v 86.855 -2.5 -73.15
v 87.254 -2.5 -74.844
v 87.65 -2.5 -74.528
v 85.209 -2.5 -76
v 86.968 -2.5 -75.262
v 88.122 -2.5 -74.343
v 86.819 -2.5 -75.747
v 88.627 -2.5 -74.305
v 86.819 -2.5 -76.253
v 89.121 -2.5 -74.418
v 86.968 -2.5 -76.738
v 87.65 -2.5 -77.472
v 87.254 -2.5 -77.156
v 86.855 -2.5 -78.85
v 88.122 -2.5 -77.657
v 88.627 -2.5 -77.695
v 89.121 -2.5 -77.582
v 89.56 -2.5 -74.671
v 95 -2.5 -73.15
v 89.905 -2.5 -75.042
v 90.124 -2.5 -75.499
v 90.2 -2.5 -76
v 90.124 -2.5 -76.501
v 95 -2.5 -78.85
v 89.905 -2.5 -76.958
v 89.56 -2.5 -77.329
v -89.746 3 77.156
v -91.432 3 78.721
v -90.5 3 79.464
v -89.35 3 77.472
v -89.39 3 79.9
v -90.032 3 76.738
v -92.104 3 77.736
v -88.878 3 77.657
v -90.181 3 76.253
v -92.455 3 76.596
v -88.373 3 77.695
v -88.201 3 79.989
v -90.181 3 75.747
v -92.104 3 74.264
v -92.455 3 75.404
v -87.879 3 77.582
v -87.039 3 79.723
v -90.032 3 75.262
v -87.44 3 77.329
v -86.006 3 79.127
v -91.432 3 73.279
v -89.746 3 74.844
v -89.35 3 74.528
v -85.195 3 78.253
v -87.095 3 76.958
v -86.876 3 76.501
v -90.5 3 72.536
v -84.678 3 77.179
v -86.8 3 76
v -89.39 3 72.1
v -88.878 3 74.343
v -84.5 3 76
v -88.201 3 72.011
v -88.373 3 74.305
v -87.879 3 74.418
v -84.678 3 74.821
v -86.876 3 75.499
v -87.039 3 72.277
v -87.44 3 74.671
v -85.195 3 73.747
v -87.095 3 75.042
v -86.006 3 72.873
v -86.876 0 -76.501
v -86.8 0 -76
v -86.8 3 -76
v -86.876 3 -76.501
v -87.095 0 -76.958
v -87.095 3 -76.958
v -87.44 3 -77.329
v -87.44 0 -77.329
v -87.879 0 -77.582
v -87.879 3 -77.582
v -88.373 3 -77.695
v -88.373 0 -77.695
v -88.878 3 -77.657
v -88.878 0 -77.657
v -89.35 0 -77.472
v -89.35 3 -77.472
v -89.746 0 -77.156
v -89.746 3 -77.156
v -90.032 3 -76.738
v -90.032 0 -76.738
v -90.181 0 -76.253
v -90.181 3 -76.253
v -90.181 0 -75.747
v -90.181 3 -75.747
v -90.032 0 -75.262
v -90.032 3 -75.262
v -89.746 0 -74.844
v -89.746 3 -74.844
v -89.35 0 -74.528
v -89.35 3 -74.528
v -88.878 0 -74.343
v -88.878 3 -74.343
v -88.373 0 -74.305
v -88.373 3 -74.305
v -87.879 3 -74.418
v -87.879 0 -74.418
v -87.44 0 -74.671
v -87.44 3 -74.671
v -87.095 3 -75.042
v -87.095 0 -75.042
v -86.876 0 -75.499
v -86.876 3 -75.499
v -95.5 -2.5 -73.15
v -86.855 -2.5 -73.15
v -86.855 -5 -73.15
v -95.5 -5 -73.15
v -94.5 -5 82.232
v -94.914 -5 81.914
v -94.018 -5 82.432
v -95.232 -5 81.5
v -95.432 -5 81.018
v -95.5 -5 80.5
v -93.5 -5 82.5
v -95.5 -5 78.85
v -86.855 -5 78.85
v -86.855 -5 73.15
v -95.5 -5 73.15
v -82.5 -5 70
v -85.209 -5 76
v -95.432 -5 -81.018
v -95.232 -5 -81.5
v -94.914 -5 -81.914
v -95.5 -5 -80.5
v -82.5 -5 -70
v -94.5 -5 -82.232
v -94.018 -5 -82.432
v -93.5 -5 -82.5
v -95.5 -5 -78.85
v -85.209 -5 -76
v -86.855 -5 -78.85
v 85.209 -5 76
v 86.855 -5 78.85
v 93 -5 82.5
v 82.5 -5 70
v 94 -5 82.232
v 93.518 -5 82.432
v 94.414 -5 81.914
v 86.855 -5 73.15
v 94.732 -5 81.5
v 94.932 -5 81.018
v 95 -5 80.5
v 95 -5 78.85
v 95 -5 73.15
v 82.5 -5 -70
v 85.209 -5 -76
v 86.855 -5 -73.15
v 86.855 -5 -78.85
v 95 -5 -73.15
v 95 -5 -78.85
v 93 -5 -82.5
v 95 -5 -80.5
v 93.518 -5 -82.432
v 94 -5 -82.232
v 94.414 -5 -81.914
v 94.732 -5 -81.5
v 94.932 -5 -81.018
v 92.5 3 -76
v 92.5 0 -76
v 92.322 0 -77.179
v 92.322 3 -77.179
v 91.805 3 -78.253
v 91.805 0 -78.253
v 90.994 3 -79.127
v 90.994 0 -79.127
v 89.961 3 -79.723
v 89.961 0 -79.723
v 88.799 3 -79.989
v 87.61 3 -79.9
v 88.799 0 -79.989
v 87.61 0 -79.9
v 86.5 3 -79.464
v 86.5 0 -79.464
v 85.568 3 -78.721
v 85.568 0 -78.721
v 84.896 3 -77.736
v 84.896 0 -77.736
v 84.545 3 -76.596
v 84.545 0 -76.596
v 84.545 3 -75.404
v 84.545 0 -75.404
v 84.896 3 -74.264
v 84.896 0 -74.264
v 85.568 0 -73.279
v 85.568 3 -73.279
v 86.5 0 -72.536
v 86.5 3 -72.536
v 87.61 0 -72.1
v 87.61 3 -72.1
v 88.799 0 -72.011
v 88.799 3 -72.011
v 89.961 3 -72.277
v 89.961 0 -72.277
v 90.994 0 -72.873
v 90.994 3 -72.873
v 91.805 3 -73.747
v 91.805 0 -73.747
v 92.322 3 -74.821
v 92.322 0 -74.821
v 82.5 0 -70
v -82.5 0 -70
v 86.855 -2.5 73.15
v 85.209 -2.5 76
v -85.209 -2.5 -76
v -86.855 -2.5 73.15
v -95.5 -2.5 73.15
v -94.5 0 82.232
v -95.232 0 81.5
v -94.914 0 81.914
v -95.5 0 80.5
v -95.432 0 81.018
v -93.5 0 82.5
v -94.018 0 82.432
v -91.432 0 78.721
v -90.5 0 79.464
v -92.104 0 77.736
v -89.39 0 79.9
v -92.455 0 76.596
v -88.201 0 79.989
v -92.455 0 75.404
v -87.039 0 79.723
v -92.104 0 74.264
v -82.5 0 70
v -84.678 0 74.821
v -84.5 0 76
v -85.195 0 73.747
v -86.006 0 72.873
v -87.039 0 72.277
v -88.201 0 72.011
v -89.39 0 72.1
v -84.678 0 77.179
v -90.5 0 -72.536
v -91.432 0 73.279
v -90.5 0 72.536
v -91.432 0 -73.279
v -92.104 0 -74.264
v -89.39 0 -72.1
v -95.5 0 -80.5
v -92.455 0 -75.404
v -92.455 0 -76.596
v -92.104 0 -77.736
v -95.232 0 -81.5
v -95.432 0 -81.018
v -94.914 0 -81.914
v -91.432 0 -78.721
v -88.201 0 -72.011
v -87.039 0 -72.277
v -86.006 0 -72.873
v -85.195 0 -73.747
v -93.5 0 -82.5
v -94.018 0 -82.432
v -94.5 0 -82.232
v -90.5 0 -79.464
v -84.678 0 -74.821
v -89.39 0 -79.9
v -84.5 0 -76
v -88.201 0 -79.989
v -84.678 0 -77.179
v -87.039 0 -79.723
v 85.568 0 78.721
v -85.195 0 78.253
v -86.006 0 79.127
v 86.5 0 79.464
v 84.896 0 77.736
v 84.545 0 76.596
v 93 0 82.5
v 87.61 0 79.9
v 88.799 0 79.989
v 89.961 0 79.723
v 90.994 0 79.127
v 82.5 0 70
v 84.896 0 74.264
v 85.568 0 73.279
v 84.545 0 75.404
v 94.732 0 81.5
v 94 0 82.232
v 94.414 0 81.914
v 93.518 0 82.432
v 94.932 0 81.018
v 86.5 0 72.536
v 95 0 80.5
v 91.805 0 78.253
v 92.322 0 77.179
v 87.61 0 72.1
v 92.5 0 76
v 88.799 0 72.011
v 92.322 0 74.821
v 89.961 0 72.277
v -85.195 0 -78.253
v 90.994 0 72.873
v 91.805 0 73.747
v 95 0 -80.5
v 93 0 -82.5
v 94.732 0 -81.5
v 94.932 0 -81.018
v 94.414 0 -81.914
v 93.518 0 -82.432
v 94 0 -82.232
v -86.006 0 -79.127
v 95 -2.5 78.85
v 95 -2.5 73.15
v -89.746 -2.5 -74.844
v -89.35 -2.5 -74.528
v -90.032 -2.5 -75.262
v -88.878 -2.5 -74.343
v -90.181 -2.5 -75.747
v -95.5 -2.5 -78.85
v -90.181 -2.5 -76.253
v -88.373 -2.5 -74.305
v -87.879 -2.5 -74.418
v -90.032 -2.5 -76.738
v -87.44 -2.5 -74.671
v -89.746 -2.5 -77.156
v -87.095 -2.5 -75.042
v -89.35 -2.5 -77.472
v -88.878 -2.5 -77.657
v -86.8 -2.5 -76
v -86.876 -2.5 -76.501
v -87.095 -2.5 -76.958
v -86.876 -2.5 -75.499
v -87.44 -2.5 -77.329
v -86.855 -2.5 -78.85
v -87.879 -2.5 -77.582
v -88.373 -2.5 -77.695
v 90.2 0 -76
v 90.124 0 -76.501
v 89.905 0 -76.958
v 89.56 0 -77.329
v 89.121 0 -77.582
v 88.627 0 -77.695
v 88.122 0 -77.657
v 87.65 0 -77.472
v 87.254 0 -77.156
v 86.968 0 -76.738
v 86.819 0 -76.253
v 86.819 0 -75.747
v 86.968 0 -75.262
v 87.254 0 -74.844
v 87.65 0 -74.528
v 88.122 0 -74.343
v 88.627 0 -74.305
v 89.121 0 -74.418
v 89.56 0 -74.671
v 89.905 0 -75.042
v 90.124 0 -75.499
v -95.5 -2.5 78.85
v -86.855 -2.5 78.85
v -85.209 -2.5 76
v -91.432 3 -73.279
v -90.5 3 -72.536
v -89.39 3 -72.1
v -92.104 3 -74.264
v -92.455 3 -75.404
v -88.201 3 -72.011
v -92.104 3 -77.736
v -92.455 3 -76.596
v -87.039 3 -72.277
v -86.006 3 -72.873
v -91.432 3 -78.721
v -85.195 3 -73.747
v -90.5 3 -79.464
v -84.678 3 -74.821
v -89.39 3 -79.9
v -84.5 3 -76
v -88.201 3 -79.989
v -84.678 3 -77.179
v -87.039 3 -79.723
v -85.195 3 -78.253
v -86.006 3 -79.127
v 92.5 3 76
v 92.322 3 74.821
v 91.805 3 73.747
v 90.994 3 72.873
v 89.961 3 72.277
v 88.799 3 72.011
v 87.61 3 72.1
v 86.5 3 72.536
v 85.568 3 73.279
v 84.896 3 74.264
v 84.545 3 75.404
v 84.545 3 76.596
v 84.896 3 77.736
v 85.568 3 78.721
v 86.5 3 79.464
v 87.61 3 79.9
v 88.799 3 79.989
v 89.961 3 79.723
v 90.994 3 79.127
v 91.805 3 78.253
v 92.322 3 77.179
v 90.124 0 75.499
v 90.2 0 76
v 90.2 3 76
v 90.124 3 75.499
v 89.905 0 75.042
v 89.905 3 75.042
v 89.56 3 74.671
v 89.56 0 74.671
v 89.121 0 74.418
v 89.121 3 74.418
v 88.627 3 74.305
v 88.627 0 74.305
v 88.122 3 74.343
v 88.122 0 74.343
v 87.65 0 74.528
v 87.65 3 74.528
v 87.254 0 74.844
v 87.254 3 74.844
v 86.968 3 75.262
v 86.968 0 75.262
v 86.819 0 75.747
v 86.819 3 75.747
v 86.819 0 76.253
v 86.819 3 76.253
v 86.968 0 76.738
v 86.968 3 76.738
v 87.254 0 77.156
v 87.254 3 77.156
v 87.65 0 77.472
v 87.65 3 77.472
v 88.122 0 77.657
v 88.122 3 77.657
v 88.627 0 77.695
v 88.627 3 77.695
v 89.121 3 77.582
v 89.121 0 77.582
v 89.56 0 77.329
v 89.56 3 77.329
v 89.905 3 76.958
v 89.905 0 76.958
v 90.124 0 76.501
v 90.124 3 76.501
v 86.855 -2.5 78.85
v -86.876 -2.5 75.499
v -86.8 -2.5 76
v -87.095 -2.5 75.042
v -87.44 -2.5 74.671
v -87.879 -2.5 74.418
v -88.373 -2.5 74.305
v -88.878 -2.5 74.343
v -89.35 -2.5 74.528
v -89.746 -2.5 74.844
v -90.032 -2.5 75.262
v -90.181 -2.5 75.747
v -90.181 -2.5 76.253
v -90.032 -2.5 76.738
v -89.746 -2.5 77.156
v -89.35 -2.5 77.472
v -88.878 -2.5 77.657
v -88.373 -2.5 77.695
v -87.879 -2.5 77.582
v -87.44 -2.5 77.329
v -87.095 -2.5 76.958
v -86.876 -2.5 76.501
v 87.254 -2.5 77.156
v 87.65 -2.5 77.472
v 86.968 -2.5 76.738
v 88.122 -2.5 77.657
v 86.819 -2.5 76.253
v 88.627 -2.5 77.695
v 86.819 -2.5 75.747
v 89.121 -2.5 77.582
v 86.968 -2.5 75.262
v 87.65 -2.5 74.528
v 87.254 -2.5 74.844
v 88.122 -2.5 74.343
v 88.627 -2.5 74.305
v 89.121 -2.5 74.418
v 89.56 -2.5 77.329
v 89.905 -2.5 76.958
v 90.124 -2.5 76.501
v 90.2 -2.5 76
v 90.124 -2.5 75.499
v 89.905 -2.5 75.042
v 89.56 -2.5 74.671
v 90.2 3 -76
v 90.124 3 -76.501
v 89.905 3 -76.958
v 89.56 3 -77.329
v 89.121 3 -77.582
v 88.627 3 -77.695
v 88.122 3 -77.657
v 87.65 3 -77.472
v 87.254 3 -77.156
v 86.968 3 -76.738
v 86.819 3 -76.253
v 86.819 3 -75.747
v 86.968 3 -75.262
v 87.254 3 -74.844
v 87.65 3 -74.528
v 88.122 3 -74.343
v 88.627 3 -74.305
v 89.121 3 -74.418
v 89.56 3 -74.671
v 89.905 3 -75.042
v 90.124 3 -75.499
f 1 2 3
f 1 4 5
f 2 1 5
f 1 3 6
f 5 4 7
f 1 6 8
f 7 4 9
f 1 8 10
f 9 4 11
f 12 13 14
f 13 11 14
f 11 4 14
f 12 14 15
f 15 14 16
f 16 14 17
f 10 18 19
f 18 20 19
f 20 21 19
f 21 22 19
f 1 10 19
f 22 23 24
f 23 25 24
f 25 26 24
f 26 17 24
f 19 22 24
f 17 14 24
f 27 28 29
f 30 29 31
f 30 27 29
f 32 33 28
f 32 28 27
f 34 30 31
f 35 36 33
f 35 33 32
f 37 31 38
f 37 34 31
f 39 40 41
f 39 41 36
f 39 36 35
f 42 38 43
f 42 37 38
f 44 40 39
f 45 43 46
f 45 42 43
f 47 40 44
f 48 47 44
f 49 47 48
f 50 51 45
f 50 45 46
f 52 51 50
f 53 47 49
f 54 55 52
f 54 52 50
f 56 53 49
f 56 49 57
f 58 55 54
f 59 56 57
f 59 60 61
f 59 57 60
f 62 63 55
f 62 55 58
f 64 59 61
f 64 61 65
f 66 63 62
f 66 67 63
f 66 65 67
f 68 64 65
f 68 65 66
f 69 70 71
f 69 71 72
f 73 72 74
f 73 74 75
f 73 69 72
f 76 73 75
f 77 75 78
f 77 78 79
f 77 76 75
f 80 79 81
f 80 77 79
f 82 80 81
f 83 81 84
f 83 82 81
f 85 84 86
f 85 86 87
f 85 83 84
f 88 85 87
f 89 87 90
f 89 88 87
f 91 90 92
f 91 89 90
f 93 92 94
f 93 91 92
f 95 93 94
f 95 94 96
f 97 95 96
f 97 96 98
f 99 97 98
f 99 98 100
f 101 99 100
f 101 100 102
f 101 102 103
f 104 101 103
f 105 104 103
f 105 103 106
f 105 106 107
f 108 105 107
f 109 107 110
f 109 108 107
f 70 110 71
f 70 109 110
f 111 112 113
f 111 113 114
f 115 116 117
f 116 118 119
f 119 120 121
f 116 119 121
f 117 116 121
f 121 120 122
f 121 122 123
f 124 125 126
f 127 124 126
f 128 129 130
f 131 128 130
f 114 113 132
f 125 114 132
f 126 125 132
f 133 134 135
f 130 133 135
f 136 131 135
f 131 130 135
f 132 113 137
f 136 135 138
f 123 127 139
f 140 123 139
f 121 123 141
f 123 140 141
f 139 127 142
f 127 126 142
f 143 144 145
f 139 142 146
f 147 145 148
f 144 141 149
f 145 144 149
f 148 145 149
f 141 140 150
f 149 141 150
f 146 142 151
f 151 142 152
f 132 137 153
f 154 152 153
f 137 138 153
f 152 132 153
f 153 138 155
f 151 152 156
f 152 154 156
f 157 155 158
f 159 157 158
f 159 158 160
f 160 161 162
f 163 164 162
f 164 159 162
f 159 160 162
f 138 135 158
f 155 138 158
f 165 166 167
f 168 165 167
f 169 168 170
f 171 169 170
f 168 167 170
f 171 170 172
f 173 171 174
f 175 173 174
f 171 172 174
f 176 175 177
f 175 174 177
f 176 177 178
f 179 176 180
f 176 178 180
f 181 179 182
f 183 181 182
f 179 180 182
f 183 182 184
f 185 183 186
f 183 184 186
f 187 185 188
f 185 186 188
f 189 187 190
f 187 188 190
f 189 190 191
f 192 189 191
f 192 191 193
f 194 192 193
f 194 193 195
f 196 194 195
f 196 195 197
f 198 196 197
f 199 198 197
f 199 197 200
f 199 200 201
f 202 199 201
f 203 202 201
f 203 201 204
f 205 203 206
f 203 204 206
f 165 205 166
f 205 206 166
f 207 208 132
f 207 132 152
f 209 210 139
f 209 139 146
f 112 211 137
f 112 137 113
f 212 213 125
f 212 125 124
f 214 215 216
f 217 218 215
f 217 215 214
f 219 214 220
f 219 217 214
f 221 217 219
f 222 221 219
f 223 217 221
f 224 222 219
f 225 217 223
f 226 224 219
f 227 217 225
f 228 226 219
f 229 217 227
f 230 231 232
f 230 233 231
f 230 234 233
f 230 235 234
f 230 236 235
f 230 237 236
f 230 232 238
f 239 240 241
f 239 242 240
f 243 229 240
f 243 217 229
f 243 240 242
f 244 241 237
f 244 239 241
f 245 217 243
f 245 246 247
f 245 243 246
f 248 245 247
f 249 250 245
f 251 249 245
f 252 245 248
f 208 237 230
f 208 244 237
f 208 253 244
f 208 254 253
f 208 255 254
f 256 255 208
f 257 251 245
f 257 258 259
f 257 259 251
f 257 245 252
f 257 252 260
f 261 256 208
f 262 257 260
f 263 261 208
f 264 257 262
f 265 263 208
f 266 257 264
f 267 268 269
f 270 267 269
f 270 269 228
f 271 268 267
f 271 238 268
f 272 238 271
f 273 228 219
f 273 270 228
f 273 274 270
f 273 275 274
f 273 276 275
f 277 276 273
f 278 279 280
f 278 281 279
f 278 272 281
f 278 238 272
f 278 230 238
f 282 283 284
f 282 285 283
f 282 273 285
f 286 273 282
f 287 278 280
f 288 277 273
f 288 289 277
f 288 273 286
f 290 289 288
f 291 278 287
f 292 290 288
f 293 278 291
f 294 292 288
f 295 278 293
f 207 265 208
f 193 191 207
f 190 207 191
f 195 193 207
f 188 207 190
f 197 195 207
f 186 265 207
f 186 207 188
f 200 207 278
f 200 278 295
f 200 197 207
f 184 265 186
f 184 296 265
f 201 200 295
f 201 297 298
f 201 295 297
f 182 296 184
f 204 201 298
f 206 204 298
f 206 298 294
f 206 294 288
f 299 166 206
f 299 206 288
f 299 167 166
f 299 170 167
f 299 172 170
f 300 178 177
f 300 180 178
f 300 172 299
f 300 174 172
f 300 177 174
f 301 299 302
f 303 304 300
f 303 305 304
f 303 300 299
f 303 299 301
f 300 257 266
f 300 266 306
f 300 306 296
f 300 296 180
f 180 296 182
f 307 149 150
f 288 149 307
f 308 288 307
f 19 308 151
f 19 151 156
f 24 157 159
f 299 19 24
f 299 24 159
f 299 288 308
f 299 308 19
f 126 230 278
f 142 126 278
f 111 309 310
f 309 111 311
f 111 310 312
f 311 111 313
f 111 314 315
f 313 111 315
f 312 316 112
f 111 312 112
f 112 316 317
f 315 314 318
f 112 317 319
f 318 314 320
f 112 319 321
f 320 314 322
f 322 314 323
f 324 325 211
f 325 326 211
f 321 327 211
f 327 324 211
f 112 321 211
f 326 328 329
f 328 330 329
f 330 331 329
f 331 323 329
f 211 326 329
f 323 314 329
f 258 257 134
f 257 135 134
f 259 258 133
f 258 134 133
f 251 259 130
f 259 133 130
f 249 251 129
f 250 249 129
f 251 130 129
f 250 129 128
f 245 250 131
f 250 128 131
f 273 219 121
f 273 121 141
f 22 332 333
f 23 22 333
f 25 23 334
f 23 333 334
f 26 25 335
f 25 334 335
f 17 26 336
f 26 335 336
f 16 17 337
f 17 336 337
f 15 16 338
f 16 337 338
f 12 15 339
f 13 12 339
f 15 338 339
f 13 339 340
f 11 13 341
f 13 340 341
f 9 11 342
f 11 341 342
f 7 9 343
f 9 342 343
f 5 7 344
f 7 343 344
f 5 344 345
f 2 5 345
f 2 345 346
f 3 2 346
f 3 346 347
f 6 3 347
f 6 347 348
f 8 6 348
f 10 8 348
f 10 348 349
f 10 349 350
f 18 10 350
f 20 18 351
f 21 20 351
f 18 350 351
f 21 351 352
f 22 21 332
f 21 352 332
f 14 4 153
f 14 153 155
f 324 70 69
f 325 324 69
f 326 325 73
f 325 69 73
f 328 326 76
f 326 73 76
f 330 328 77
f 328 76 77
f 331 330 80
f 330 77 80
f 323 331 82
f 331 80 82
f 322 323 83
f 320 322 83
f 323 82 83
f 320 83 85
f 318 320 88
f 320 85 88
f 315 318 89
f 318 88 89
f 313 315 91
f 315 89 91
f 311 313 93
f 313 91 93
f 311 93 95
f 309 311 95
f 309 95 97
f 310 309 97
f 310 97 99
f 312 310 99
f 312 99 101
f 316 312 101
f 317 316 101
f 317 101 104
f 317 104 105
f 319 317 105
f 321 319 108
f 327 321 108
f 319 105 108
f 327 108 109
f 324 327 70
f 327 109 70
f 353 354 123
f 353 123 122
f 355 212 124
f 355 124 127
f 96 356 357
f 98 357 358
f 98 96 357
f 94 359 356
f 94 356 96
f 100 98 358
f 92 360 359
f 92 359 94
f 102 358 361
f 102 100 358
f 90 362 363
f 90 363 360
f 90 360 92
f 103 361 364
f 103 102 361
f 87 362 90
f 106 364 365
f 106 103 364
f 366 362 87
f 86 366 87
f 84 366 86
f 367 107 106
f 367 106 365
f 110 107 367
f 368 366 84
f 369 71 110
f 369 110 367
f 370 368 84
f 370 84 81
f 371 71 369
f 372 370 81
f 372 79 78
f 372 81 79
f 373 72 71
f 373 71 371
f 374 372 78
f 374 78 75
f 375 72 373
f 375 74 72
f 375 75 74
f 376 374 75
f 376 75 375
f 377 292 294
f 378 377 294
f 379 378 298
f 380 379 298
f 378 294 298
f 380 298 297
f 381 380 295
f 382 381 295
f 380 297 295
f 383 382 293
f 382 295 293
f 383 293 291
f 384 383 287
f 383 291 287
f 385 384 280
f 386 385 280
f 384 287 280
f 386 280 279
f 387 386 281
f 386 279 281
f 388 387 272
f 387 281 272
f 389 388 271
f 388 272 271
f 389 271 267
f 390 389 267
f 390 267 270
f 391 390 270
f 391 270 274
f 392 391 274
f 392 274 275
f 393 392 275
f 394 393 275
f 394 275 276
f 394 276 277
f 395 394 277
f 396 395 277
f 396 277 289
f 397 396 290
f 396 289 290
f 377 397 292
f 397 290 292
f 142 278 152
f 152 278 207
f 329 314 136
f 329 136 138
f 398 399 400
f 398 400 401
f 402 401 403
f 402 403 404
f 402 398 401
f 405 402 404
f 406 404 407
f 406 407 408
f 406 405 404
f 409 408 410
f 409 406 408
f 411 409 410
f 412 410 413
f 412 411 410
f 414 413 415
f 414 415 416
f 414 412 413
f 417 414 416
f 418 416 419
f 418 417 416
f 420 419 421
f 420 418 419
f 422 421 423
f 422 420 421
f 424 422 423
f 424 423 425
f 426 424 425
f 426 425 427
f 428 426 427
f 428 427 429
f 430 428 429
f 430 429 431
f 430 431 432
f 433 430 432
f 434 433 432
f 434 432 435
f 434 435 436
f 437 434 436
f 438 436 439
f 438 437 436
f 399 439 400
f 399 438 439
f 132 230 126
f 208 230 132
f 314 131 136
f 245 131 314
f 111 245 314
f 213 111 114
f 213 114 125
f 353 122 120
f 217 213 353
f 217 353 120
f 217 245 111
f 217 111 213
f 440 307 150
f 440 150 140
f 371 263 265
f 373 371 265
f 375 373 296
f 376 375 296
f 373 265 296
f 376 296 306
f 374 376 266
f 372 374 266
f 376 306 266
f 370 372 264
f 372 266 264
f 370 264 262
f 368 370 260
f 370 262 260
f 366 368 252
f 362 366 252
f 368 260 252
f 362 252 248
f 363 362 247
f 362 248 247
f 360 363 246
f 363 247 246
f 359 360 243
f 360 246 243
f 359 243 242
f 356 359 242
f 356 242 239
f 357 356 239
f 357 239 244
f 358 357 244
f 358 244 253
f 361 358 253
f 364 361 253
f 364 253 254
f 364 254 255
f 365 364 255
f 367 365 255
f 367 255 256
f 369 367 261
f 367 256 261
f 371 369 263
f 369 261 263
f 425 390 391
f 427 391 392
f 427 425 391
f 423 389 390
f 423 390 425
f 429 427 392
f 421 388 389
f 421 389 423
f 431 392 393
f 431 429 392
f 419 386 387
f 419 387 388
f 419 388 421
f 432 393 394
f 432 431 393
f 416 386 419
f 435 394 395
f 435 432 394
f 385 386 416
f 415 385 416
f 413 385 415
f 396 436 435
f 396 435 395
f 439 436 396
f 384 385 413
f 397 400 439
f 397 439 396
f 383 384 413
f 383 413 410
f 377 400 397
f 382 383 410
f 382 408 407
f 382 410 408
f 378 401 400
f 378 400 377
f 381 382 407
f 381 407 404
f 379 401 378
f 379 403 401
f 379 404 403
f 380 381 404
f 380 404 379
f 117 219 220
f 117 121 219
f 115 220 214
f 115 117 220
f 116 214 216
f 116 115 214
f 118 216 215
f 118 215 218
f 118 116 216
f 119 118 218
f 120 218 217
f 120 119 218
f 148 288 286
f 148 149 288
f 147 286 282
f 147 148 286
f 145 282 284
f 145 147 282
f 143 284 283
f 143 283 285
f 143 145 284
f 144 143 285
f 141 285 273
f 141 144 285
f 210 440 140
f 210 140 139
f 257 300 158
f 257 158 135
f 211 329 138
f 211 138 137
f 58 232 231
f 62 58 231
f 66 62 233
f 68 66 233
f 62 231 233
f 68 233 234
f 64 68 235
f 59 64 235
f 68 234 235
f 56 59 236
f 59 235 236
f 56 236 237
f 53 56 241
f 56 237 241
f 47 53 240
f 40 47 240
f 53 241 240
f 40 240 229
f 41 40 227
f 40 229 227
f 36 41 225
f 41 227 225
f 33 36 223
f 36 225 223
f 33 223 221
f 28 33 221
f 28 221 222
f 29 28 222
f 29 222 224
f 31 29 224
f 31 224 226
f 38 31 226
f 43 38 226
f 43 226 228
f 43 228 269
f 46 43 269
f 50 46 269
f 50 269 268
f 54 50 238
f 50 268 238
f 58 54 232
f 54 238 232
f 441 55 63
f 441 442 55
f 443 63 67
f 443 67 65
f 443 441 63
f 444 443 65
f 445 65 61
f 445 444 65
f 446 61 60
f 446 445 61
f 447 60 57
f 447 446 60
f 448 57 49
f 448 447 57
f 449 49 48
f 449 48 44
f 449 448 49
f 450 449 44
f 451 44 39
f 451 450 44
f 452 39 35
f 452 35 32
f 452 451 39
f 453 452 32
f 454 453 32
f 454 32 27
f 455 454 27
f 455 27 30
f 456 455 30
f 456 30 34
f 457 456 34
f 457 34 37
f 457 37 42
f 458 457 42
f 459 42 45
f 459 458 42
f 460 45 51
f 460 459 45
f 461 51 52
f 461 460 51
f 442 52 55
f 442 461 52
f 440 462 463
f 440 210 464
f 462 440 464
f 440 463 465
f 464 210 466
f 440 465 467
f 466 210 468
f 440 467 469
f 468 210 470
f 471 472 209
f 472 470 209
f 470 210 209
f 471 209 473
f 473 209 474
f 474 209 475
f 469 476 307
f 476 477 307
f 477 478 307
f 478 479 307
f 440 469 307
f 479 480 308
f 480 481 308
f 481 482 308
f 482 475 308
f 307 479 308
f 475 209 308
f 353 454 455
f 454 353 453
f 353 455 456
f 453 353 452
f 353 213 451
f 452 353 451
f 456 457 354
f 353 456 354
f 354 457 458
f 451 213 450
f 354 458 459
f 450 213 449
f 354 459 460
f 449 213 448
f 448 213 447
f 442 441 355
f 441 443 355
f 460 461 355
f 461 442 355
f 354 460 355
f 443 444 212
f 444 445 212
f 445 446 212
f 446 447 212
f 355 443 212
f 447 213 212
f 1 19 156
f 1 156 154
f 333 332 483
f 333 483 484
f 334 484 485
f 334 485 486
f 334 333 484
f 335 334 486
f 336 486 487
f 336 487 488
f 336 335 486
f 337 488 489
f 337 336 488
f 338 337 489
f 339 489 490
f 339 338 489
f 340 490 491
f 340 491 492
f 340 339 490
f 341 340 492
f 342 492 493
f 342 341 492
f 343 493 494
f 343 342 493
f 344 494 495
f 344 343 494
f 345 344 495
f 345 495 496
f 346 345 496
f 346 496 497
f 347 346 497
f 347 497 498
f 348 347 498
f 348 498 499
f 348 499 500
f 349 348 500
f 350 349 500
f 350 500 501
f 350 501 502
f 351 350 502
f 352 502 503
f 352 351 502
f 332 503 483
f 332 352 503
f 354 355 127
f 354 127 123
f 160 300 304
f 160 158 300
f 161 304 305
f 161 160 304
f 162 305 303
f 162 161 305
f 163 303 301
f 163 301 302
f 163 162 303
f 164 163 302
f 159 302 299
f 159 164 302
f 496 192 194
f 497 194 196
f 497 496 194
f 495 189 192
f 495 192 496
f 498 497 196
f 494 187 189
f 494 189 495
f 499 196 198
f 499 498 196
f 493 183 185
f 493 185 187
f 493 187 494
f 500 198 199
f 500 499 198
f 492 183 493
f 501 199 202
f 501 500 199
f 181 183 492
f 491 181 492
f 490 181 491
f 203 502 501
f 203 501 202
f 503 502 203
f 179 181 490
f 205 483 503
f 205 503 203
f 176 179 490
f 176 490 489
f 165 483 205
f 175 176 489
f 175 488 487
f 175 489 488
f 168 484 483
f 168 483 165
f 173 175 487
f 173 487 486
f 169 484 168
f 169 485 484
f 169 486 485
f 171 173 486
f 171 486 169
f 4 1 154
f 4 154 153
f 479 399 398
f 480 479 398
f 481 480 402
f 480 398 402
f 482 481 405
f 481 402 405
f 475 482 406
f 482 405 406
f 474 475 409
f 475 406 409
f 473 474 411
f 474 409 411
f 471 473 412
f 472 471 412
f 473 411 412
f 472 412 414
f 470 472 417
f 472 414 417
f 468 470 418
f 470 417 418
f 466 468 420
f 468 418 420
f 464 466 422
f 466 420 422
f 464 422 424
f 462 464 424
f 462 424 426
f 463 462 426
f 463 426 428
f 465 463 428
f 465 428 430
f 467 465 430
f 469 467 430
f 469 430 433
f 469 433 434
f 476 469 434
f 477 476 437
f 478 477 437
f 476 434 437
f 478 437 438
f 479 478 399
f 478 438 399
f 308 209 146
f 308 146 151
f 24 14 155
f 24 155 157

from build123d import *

# Parameters (mm, degrees)
SKETCH2_W           = 165
SKETCH2_H           = 140
BOSS_EXTRUDE1_DEPTH = 5
SKETCH2_3_R         = 1.7
BOSS_EXTRUDE2_DEPTH = 2.5
BOSS_EXTRUDE3_START = 3
SKETCH2_5_R         = 4
SKETCH2_5_R_2       = 1.7
BOSS_EXTRUDE3_DEPTH = 3
FILLET1_R           = 2


with BuildPart() as part:
    # Sketch2 → Boss-Extrude1 (new body)
    with BuildSketch(Plane(origin=(0, 0, 0), x_dir=(1, 0, 0), z_dir=(0, 1, 0))):
        Polygon((-95.5, -78.85), (-95.5, -82.5), (95, -82.5), (95, -78.85), (86.854551733, -78.85), (85.209103466, -76), (86.854551733, -73.15), (95, -73.15), (95, 73.15), (86.854551733, 73.15), (85.209103466, 76), (86.854551733, 78.85), (95, 78.85), (95, 82.5), (-95.5, 82.5), (-95.5, 78.85), (-86.854551733, 78.85), (-85.209103466, 76), (-86.854551733, 73.15), (-95.5, 73.15), (-95.5, -73.15), (-86.854551733, -73.15), (-85.209103466, -76), (-86.854551733, -78.85), align=None)
        Rectangle(SKETCH2_W, SKETCH2_H, mode=Mode.SUBTRACT)
    extrude(amount=-BOSS_EXTRUDE1_DEPTH)

    # Sketch2<3> → Boss-Extrude2 (add)
    # profile 1 of 4: a face of its own
    with BuildSketch(Plane(origin=(0, 0, 0), x_dir=(1, 0, 0), z_dir=(0, 1, 0))):
        Polygon((-95.5, -78.85), (-86.854551733, -78.85), (-85.209103466, -76), (-86.854551733, -73.15), (-95.5, -73.15), align=None)
        with Locations((-88.5, -76)):
            Circle(SKETCH2_3_R, mode=Mode.SUBTRACT)
    # profile 2 of 4: a face of its own
    with BuildSketch(Plane(origin=(0, 0, 0), x_dir=(1, 0, 0), z_dir=(0, 1, 0))):
        Polygon((95, -78.85), (95, -73.15), (86.854551733, -73.15), (85.209103466, -76), (86.854551733, -78.85), align=None)
        with Locations((88.5, -76)):
            Circle(SKETCH2_3_R, mode=Mode.SUBTRACT)
    # profile 3 of 4: a face of its own
    with BuildSketch(Plane(origin=(0, 0, 0), x_dir=(1, 0, 0), z_dir=(0, 1, 0))):
        Polygon((-95.5, 73.15), (-86.854551733, 73.15), (-85.209103466, 76), (-86.854551733, 78.85), (-95.5, 78.85), align=None)
        with Locations((-88.5, 76)):
            Circle(SKETCH2_3_R, mode=Mode.SUBTRACT)
    # profile 4 of 4: a face of its own
    with BuildSketch(Plane(origin=(0, 0, 0), x_dir=(1, 0, 0), z_dir=(0, 1, 0))):
        Polygon((95, 73.15), (95, 78.85), (86.854551733, 78.85), (85.209103466, 76), (86.854551733, 73.15), align=None)
        with Locations((88.5, 76)):
            Circle(SKETCH2_3_R, mode=Mode.SUBTRACT)
    extrude(amount=-BOSS_EXTRUDE2_DEPTH)

    # Sketch2<5> → Boss-Extrude3 (add)
    # profile 1 of 4: a face of its own
    with BuildSketch(Plane(origin=(0, 0, 0), x_dir=(1, 0, 0), z_dir=(0, 1, 0)).offset(BOSS_EXTRUDE3_START)):
        with Locations((-88.5, -76)):
            Circle(SKETCH2_5_R)
        with Locations((-88.5, -76)):
            Circle(SKETCH2_5_R_2, mode=Mode.SUBTRACT)
    # profile 2 of 4: a face of its own
    with BuildSketch(Plane(origin=(0, 0, 0), x_dir=(1, 0, 0), z_dir=(0, 1, 0)).offset(BOSS_EXTRUDE3_START)):
        with Locations((88.5, -76)):
            Circle(SKETCH2_5_R)
        with Locations((88.5, -76)):
            Circle(SKETCH2_5_R_2, mode=Mode.SUBTRACT)
    # profile 3 of 4: a face of its own
    with BuildSketch(Plane(origin=(0, 0, 0), x_dir=(1, 0, 0), z_dir=(0, 1, 0)).offset(BOSS_EXTRUDE3_START)):
        with Locations((-88.5, 76)):
            Circle(SKETCH2_5_R)
        with Locations((-88.5, 76)):
            Circle(SKETCH2_5_R_2, mode=Mode.SUBTRACT)
    # profile 4 of 4: a face of its own
    with BuildSketch(Plane(origin=(0, 0, 0), x_dir=(1, 0, 0), z_dir=(0, 1, 0)).offset(BOSS_EXTRUDE3_START)):
        with Locations((88.5, 76)):
            Circle(SKETCH2_5_R)
        with Locations((88.5, 76)):
            Circle(SKETCH2_5_R_2, mode=Mode.SUBTRACT)
    extrude(amount=-BOSS_EXTRUDE3_DEPTH)

    # Fillet1
    fillet1_edges = [part.edges().sort_by_distance(p)[0] for p in [
        (95, -2.5, -82.5),
        (-95.5, -2.5, -82.5),
        (-95.5, -2.5, 82.5),
        (95, -2.5, 82.5),
    ]]
    fillet(fillet1_edges, radius=FILLET1_R)


solid = part.part
